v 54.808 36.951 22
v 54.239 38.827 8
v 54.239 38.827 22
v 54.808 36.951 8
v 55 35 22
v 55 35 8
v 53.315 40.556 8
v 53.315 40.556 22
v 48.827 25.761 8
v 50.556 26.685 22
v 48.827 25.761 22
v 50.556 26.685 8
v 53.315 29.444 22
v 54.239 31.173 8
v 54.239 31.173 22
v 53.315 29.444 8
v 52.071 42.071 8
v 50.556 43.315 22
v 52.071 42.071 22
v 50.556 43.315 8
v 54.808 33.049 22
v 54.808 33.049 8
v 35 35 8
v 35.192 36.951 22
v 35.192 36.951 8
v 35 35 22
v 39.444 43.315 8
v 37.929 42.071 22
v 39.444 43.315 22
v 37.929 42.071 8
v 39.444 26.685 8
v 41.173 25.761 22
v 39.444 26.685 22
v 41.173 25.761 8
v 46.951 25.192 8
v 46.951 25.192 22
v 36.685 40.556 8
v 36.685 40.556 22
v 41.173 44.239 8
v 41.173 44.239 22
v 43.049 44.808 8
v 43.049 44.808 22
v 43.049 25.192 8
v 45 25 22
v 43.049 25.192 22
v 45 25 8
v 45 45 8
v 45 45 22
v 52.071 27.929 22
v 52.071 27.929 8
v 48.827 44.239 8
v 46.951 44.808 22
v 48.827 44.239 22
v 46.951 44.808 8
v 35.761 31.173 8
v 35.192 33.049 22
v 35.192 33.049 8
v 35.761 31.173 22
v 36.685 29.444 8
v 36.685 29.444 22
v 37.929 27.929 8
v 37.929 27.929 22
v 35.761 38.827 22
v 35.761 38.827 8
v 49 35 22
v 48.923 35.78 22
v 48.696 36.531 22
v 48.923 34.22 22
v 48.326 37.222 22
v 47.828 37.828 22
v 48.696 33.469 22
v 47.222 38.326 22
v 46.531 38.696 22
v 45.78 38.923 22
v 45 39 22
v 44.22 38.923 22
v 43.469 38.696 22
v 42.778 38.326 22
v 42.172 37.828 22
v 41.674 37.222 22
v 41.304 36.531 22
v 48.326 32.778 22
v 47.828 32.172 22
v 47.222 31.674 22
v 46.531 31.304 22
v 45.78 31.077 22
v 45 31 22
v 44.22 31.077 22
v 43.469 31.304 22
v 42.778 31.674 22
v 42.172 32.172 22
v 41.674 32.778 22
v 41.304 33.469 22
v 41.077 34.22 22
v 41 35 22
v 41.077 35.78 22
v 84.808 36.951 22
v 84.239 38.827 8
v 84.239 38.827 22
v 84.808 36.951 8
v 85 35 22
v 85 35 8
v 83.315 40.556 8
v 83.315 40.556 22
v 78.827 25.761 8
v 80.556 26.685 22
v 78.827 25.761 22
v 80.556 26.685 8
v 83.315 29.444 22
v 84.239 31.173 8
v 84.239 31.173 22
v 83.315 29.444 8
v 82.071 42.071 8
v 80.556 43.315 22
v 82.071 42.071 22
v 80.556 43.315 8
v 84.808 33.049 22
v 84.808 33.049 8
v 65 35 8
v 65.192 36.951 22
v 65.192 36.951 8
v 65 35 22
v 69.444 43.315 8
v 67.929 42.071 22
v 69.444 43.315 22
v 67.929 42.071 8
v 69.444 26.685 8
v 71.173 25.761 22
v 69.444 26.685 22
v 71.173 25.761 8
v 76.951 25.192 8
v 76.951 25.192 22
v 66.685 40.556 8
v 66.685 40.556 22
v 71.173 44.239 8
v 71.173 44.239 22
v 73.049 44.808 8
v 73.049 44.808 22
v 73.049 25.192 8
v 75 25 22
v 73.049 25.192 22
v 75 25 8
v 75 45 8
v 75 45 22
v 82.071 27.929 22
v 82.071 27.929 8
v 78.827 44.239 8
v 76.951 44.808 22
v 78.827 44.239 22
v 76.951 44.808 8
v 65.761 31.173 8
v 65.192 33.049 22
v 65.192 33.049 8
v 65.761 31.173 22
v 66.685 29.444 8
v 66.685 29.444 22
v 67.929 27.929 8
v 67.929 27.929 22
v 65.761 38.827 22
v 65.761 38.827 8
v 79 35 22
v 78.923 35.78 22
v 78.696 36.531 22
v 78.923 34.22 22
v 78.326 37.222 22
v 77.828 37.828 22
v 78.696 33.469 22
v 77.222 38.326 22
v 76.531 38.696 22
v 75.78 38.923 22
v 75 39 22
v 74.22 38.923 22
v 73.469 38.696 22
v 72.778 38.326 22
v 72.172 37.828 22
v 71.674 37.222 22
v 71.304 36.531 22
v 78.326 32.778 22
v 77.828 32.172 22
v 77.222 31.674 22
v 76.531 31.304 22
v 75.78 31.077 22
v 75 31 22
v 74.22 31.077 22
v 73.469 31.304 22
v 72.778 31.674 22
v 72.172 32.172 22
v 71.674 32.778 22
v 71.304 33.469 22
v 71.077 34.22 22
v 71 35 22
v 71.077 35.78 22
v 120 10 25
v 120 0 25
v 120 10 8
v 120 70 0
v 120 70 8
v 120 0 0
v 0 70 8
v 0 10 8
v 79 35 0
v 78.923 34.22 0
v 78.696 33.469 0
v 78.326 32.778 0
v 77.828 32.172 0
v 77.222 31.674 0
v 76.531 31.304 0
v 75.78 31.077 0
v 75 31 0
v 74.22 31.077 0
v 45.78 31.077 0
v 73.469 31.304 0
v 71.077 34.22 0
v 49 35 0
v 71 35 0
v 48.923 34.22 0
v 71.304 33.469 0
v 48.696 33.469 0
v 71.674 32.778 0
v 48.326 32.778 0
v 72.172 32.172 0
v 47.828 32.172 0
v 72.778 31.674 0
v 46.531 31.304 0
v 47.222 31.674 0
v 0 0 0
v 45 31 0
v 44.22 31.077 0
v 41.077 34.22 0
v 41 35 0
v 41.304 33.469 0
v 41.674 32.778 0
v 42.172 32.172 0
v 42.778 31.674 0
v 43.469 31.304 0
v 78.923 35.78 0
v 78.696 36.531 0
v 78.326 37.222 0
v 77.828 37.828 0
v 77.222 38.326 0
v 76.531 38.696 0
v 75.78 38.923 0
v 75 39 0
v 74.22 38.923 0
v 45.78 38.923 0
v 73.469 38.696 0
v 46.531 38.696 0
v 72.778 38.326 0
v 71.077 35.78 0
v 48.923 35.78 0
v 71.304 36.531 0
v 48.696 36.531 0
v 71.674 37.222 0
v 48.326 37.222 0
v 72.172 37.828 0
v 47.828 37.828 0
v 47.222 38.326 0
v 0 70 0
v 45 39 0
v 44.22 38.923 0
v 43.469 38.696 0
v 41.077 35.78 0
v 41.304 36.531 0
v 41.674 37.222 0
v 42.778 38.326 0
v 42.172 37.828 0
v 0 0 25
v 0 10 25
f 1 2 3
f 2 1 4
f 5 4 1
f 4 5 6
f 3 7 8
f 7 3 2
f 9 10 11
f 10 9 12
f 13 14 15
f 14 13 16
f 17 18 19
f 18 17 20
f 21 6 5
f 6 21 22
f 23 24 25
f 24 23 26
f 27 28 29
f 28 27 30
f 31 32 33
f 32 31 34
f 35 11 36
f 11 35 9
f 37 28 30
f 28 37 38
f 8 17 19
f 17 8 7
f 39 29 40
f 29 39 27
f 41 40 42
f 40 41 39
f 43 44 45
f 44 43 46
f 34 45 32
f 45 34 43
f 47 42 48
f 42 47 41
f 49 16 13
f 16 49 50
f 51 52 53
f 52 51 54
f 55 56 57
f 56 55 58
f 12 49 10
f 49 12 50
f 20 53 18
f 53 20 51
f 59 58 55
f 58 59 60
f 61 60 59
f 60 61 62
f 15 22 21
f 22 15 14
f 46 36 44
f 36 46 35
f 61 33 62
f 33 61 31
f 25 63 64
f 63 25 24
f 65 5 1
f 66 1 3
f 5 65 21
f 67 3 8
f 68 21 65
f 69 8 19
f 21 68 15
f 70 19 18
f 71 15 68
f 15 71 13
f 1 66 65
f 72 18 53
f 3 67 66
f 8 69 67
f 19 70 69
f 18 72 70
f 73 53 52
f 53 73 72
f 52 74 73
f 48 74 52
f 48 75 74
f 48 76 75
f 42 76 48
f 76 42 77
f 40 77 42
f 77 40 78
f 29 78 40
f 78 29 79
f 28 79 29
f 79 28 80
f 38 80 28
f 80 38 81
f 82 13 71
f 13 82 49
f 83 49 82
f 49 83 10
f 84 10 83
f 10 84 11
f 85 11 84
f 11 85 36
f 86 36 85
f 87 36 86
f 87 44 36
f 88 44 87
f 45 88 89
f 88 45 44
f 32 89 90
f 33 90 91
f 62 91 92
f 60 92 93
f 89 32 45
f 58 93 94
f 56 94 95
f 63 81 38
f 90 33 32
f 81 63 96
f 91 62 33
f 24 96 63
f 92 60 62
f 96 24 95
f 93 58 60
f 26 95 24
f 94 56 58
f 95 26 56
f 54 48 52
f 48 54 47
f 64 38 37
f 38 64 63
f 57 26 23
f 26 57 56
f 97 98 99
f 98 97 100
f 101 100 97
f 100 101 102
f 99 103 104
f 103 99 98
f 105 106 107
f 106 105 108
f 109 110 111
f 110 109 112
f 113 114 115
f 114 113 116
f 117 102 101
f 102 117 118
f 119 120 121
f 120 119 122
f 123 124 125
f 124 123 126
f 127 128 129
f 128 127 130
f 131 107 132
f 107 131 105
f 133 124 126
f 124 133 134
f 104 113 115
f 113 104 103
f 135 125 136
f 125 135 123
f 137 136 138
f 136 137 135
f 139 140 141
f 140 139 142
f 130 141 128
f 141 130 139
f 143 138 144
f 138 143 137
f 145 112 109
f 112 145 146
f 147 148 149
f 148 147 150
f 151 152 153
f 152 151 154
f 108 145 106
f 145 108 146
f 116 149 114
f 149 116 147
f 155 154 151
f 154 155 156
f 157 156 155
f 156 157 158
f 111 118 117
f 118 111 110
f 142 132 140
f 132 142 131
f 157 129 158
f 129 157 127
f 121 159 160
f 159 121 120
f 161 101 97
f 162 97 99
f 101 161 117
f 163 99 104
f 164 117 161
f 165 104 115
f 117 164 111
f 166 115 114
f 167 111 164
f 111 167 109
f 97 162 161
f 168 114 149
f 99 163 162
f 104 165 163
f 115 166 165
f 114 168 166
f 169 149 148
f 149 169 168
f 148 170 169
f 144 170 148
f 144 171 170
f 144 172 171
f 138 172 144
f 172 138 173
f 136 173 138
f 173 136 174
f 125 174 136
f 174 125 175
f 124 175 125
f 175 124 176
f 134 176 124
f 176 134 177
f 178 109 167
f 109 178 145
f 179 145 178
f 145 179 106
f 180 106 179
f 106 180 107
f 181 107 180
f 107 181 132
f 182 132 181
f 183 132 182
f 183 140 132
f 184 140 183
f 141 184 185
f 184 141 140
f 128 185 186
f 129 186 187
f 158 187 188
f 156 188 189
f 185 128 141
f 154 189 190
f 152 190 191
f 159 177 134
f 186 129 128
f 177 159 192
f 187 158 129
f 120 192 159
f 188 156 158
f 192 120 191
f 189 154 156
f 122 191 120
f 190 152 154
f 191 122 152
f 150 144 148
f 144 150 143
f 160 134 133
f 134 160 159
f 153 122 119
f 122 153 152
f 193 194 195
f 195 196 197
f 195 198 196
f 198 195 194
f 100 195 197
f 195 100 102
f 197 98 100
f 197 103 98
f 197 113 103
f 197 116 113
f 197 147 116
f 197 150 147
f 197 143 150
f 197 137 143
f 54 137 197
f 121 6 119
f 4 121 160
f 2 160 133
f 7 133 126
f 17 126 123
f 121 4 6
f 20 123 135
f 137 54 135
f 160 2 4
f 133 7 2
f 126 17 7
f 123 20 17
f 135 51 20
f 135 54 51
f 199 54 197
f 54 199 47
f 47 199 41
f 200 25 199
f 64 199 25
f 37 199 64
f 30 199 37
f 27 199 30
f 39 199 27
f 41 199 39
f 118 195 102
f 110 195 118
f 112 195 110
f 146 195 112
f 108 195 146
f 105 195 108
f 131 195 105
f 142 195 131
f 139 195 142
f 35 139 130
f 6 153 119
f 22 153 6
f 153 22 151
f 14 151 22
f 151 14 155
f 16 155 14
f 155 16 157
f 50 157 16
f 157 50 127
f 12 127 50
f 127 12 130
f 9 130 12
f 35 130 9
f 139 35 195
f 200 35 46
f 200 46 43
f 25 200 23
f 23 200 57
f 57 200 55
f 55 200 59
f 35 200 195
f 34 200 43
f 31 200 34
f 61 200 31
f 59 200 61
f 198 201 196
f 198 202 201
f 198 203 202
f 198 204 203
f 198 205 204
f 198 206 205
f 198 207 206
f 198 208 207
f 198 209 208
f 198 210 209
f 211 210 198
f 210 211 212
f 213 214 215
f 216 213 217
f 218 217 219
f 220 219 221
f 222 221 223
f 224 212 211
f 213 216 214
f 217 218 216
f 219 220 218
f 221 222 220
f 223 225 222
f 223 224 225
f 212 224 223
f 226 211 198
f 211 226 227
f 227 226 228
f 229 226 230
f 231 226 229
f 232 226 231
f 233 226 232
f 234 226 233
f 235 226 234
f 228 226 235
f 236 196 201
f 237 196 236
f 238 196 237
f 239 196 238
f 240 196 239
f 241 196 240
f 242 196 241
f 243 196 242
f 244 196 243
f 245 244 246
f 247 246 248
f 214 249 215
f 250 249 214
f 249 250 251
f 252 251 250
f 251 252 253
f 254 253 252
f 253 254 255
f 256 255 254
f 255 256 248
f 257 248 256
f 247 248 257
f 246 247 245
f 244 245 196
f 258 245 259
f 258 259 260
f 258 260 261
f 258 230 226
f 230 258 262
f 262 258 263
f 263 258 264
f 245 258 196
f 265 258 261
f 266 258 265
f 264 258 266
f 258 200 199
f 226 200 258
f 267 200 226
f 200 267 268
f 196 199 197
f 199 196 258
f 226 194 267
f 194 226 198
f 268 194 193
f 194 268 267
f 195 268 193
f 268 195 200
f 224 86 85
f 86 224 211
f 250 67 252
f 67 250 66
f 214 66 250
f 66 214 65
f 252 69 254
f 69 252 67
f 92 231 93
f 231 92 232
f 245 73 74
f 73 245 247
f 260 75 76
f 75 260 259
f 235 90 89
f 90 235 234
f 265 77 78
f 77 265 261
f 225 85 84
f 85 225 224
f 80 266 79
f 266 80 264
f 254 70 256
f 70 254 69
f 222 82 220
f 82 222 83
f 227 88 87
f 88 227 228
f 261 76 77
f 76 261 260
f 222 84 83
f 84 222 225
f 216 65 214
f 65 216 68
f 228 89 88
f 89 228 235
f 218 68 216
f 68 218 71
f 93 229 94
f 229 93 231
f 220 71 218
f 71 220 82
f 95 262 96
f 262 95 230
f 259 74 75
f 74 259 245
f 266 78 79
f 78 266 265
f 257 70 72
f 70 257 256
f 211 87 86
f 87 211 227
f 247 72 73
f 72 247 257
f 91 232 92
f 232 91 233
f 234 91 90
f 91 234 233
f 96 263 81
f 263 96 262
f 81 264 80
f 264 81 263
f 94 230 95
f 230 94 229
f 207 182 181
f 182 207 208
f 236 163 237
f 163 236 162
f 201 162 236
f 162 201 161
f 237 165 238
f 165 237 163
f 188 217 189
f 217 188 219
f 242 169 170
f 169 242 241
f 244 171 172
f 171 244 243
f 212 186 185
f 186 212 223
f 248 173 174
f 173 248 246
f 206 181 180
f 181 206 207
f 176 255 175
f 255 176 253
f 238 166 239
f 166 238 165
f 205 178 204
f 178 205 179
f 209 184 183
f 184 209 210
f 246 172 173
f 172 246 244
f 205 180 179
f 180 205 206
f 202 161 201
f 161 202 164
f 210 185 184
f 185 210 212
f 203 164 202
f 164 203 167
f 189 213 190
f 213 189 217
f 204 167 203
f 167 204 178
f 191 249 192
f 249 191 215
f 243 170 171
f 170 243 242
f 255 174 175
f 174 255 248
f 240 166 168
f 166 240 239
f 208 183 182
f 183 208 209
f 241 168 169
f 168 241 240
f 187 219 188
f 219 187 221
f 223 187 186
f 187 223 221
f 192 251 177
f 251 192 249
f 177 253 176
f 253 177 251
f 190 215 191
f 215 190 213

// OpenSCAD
$fn = 32;

// ----------------------------------------------------------------------
// Drill jig: fence jig
// ----------------------------------------------------------------------

// --- parameters (mm) ---
plate_l = 120;            // plate length, X
plate_w = 70;             // plate width, Y
plate_t = 8;              // plate thickness
boss_d = 20;              // guide boss diameter
boss_h = 15;              // boss height above the plate
guide_d = 8;              // guide hole diameter
boss_pitch = 30;          // boss pitch
fence_h = 18;             // fence height above the plate
fence_t = 10;             // fence thickness

n_boss = 2;  // guide bosses
boss_x0 = (plate_l - (n_boss - 1) * boss_pitch) / 2;  // first boss X
boss_top = plate_t - 1 + boss_h;  // boss crown height
fence_top = plate_t - 1 + fence_h;  // fence crown height
total_h = max([fence_top, boss_top]);  // overall height

difference() {
  union() {
  cube([plate_l, plate_w, plate_t]);
  for (i = [0 : n_boss - 1])
    translate([boss_x0 + i * boss_pitch, plate_w / 2, plate_t - 1])
      cylinder(h = boss_h, d = boss_d);
  translate([0, 0, plate_t - 1]) cube([plate_l, fence_t, fence_h]);
  }
  for (i = [0 : n_boss - 1])
    translate([boss_x0 + i * boss_pitch, plate_w / 2, -1])
      cylinder(h = plate_t + boss_h, d = guide_d);
}
